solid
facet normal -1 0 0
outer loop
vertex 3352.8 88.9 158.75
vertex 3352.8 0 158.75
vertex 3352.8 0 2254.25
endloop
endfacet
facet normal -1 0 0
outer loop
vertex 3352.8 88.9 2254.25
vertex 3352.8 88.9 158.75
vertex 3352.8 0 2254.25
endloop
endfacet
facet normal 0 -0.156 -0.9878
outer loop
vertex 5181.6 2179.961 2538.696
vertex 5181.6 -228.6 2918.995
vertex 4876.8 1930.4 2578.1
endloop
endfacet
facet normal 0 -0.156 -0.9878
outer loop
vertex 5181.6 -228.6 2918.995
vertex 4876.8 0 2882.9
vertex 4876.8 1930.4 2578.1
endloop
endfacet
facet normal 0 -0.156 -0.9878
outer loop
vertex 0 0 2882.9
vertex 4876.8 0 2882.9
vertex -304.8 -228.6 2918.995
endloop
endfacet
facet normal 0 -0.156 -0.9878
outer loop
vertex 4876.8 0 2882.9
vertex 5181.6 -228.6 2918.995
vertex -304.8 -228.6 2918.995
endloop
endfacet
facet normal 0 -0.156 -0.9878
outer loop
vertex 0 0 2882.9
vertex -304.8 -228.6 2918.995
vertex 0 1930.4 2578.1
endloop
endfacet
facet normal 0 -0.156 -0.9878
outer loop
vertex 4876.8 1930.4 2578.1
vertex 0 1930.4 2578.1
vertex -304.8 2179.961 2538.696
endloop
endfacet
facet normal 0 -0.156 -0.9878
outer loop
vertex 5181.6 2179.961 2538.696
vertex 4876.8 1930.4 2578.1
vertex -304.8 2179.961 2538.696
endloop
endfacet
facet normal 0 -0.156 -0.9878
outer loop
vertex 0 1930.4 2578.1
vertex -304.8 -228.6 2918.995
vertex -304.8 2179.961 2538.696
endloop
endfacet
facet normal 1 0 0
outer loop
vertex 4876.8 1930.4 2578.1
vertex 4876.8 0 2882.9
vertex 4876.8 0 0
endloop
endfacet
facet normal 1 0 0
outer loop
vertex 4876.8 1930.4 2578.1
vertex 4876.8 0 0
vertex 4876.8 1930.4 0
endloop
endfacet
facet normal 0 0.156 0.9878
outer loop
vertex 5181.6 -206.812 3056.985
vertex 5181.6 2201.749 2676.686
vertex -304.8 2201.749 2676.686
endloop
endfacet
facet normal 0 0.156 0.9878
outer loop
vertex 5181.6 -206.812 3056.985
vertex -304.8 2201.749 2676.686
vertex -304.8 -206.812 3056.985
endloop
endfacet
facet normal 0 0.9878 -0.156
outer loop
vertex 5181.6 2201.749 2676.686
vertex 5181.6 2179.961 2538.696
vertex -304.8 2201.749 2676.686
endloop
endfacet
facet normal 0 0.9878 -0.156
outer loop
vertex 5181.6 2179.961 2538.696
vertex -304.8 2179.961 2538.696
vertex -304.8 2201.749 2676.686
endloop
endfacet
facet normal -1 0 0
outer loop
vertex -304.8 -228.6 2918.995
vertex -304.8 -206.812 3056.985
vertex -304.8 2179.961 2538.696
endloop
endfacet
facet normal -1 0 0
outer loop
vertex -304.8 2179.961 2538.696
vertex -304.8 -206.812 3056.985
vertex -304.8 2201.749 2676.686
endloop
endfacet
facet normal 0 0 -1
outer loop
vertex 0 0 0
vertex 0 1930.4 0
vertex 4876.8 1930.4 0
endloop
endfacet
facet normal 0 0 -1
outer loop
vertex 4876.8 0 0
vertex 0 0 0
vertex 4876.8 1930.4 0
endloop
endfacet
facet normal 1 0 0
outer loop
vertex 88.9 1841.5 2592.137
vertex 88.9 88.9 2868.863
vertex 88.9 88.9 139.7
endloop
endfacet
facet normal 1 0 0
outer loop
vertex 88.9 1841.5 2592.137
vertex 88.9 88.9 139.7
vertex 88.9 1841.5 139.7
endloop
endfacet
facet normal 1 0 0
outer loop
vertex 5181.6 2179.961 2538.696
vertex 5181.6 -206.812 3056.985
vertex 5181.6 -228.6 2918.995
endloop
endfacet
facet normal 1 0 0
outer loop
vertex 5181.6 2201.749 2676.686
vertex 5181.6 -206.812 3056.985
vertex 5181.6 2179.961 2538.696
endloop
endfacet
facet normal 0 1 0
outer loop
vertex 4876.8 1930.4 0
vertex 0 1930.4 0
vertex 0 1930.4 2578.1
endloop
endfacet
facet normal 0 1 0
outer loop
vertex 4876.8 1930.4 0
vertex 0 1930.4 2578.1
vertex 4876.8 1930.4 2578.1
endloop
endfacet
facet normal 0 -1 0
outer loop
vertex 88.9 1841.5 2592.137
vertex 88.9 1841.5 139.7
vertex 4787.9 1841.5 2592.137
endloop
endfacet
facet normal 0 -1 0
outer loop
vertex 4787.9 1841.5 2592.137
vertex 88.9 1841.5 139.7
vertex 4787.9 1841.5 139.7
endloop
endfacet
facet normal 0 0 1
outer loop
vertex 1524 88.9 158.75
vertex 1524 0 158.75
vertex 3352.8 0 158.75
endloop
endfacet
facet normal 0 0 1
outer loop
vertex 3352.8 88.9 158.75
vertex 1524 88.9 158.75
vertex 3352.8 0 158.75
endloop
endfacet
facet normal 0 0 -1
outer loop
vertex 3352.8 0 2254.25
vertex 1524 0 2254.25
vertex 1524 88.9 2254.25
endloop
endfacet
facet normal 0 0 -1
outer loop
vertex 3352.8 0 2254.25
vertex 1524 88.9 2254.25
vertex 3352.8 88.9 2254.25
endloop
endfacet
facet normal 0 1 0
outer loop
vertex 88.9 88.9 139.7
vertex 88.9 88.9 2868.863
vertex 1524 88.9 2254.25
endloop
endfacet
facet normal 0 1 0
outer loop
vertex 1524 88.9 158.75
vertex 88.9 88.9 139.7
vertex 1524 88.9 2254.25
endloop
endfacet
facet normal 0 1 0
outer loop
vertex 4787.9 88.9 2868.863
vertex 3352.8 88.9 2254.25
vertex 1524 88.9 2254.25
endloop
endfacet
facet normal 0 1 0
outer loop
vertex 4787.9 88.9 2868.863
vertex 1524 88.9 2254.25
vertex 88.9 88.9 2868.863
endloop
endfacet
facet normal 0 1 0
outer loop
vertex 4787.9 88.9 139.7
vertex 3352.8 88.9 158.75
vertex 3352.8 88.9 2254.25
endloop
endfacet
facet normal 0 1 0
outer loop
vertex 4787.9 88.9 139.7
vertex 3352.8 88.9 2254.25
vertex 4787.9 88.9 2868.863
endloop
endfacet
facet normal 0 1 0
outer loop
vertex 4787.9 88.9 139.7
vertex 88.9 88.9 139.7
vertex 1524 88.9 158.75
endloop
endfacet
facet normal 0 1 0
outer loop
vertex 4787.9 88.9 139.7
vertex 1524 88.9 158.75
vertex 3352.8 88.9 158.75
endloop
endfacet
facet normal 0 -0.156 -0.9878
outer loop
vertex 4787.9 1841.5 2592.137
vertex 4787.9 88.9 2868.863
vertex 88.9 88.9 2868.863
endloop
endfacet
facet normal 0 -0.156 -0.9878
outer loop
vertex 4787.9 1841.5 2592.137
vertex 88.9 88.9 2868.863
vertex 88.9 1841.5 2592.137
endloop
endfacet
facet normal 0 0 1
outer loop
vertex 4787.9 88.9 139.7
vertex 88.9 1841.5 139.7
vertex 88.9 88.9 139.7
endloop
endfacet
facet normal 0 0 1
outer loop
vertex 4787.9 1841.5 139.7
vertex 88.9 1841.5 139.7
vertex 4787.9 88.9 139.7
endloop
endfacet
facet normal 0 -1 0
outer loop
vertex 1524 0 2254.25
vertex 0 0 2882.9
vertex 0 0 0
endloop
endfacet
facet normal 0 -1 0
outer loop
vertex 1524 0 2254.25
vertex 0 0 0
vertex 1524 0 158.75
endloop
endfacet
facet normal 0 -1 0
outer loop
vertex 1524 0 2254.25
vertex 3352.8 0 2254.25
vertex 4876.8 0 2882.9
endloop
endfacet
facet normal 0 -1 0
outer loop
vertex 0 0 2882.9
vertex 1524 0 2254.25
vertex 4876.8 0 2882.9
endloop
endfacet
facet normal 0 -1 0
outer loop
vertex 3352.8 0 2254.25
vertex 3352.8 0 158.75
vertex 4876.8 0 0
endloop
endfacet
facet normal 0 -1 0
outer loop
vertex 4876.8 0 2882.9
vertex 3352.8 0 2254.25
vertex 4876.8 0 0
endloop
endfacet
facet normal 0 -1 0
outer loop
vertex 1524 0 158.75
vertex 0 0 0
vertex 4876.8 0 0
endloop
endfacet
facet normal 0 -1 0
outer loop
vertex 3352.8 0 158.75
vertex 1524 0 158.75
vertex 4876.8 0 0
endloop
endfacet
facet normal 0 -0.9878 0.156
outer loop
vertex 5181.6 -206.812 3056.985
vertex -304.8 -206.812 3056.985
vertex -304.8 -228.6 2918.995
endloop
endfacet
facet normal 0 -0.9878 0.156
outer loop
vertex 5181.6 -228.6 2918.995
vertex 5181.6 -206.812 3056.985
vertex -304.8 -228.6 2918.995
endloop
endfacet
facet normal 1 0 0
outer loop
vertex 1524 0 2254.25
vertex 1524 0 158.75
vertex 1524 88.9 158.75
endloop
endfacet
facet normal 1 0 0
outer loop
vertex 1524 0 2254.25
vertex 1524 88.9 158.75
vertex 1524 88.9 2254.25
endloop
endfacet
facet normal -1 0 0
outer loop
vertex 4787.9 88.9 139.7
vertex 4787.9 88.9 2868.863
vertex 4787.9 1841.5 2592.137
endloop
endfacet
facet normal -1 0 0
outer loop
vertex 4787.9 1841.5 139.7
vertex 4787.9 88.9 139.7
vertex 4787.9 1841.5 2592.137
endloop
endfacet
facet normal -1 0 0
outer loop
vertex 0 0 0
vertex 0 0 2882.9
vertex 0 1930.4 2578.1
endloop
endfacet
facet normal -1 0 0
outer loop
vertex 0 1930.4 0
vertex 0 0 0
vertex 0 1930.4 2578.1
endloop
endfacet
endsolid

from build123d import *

# Parameters (mm, degrees)
F0_W          = 4876.8
F0_H          = 1930.4
F1_DEPTH      = 139.7
F2_W          = 4876.8
F2_H          = 1930.4
F2_W_2        = 4699
F2_H_2        = 1752.6
F3_DEPTH      = 2743.2
F5_DEPTH      = 4876.801
F7_DEPTH      = 5181.6
F7_DEPTH_BACK = 304.8
F8_W          = 1828.8
F8_H          = 2095.5
F9_DEPTH      = 304.8


with BuildPart() as f1:
    # F0 (on Top) → F1 (new body)
    with BuildSketch(Plane.XY):
        with Locations((2438.4, 965.2)):
            Rectangle(F0_W, F0_H)
    extrude(amount=F1_DEPTH)

    # F2 (on face) → F3 (join)
    with BuildSketch(Plane.XY.offset(139.7)):
        with Locations((2438.4, 965.2)):
            Rectangle(F2_W, F2_H)
        with Locations((2438.4, 965.2)):
            Rectangle(F2_W_2, F2_H_2, mode=Mode.SUBTRACT)
    extrude(amount=F3_DEPTH)

    # F4 (on face) → F5 (cut, through all)
    with BuildSketch(Plane.YZ.offset(4876.8)):
        Polygon((1930.4, 2578.1), (1930.4, 2882.9), (0, 2882.9), align=None)
    extrude(amount=-F5_DEPTH, mode=Mode.SUBTRACT)

    # F6 (on face) → F7 (join, two sides)
    with BuildSketch(Plane.YZ.offset(4876.8)) as f7_sk:
        Polygon((-228.6, 2918.9947368421), (0, 2882.9), (1930.4, 2578.1), (2179.9612146584, 2538.6955976855), (2201.7491861726, 2676.686083942), (-206.8120284858, 3056.9852230986), align=None)
    extrude(amount=-F7_DEPTH)
    extrude(f7_sk.sketch, amount=F7_DEPTH_BACK)

    # F8 (on face) → F9 (cut)
    with BuildSketch(Plane.XZ):
        with Locations((2438.4, 1206.5)):
            Rectangle(F8_W, F8_H)
    extrude(amount=-F9_DEPTH, mode=Mode.SUBTRACT)


solid = f1.part
